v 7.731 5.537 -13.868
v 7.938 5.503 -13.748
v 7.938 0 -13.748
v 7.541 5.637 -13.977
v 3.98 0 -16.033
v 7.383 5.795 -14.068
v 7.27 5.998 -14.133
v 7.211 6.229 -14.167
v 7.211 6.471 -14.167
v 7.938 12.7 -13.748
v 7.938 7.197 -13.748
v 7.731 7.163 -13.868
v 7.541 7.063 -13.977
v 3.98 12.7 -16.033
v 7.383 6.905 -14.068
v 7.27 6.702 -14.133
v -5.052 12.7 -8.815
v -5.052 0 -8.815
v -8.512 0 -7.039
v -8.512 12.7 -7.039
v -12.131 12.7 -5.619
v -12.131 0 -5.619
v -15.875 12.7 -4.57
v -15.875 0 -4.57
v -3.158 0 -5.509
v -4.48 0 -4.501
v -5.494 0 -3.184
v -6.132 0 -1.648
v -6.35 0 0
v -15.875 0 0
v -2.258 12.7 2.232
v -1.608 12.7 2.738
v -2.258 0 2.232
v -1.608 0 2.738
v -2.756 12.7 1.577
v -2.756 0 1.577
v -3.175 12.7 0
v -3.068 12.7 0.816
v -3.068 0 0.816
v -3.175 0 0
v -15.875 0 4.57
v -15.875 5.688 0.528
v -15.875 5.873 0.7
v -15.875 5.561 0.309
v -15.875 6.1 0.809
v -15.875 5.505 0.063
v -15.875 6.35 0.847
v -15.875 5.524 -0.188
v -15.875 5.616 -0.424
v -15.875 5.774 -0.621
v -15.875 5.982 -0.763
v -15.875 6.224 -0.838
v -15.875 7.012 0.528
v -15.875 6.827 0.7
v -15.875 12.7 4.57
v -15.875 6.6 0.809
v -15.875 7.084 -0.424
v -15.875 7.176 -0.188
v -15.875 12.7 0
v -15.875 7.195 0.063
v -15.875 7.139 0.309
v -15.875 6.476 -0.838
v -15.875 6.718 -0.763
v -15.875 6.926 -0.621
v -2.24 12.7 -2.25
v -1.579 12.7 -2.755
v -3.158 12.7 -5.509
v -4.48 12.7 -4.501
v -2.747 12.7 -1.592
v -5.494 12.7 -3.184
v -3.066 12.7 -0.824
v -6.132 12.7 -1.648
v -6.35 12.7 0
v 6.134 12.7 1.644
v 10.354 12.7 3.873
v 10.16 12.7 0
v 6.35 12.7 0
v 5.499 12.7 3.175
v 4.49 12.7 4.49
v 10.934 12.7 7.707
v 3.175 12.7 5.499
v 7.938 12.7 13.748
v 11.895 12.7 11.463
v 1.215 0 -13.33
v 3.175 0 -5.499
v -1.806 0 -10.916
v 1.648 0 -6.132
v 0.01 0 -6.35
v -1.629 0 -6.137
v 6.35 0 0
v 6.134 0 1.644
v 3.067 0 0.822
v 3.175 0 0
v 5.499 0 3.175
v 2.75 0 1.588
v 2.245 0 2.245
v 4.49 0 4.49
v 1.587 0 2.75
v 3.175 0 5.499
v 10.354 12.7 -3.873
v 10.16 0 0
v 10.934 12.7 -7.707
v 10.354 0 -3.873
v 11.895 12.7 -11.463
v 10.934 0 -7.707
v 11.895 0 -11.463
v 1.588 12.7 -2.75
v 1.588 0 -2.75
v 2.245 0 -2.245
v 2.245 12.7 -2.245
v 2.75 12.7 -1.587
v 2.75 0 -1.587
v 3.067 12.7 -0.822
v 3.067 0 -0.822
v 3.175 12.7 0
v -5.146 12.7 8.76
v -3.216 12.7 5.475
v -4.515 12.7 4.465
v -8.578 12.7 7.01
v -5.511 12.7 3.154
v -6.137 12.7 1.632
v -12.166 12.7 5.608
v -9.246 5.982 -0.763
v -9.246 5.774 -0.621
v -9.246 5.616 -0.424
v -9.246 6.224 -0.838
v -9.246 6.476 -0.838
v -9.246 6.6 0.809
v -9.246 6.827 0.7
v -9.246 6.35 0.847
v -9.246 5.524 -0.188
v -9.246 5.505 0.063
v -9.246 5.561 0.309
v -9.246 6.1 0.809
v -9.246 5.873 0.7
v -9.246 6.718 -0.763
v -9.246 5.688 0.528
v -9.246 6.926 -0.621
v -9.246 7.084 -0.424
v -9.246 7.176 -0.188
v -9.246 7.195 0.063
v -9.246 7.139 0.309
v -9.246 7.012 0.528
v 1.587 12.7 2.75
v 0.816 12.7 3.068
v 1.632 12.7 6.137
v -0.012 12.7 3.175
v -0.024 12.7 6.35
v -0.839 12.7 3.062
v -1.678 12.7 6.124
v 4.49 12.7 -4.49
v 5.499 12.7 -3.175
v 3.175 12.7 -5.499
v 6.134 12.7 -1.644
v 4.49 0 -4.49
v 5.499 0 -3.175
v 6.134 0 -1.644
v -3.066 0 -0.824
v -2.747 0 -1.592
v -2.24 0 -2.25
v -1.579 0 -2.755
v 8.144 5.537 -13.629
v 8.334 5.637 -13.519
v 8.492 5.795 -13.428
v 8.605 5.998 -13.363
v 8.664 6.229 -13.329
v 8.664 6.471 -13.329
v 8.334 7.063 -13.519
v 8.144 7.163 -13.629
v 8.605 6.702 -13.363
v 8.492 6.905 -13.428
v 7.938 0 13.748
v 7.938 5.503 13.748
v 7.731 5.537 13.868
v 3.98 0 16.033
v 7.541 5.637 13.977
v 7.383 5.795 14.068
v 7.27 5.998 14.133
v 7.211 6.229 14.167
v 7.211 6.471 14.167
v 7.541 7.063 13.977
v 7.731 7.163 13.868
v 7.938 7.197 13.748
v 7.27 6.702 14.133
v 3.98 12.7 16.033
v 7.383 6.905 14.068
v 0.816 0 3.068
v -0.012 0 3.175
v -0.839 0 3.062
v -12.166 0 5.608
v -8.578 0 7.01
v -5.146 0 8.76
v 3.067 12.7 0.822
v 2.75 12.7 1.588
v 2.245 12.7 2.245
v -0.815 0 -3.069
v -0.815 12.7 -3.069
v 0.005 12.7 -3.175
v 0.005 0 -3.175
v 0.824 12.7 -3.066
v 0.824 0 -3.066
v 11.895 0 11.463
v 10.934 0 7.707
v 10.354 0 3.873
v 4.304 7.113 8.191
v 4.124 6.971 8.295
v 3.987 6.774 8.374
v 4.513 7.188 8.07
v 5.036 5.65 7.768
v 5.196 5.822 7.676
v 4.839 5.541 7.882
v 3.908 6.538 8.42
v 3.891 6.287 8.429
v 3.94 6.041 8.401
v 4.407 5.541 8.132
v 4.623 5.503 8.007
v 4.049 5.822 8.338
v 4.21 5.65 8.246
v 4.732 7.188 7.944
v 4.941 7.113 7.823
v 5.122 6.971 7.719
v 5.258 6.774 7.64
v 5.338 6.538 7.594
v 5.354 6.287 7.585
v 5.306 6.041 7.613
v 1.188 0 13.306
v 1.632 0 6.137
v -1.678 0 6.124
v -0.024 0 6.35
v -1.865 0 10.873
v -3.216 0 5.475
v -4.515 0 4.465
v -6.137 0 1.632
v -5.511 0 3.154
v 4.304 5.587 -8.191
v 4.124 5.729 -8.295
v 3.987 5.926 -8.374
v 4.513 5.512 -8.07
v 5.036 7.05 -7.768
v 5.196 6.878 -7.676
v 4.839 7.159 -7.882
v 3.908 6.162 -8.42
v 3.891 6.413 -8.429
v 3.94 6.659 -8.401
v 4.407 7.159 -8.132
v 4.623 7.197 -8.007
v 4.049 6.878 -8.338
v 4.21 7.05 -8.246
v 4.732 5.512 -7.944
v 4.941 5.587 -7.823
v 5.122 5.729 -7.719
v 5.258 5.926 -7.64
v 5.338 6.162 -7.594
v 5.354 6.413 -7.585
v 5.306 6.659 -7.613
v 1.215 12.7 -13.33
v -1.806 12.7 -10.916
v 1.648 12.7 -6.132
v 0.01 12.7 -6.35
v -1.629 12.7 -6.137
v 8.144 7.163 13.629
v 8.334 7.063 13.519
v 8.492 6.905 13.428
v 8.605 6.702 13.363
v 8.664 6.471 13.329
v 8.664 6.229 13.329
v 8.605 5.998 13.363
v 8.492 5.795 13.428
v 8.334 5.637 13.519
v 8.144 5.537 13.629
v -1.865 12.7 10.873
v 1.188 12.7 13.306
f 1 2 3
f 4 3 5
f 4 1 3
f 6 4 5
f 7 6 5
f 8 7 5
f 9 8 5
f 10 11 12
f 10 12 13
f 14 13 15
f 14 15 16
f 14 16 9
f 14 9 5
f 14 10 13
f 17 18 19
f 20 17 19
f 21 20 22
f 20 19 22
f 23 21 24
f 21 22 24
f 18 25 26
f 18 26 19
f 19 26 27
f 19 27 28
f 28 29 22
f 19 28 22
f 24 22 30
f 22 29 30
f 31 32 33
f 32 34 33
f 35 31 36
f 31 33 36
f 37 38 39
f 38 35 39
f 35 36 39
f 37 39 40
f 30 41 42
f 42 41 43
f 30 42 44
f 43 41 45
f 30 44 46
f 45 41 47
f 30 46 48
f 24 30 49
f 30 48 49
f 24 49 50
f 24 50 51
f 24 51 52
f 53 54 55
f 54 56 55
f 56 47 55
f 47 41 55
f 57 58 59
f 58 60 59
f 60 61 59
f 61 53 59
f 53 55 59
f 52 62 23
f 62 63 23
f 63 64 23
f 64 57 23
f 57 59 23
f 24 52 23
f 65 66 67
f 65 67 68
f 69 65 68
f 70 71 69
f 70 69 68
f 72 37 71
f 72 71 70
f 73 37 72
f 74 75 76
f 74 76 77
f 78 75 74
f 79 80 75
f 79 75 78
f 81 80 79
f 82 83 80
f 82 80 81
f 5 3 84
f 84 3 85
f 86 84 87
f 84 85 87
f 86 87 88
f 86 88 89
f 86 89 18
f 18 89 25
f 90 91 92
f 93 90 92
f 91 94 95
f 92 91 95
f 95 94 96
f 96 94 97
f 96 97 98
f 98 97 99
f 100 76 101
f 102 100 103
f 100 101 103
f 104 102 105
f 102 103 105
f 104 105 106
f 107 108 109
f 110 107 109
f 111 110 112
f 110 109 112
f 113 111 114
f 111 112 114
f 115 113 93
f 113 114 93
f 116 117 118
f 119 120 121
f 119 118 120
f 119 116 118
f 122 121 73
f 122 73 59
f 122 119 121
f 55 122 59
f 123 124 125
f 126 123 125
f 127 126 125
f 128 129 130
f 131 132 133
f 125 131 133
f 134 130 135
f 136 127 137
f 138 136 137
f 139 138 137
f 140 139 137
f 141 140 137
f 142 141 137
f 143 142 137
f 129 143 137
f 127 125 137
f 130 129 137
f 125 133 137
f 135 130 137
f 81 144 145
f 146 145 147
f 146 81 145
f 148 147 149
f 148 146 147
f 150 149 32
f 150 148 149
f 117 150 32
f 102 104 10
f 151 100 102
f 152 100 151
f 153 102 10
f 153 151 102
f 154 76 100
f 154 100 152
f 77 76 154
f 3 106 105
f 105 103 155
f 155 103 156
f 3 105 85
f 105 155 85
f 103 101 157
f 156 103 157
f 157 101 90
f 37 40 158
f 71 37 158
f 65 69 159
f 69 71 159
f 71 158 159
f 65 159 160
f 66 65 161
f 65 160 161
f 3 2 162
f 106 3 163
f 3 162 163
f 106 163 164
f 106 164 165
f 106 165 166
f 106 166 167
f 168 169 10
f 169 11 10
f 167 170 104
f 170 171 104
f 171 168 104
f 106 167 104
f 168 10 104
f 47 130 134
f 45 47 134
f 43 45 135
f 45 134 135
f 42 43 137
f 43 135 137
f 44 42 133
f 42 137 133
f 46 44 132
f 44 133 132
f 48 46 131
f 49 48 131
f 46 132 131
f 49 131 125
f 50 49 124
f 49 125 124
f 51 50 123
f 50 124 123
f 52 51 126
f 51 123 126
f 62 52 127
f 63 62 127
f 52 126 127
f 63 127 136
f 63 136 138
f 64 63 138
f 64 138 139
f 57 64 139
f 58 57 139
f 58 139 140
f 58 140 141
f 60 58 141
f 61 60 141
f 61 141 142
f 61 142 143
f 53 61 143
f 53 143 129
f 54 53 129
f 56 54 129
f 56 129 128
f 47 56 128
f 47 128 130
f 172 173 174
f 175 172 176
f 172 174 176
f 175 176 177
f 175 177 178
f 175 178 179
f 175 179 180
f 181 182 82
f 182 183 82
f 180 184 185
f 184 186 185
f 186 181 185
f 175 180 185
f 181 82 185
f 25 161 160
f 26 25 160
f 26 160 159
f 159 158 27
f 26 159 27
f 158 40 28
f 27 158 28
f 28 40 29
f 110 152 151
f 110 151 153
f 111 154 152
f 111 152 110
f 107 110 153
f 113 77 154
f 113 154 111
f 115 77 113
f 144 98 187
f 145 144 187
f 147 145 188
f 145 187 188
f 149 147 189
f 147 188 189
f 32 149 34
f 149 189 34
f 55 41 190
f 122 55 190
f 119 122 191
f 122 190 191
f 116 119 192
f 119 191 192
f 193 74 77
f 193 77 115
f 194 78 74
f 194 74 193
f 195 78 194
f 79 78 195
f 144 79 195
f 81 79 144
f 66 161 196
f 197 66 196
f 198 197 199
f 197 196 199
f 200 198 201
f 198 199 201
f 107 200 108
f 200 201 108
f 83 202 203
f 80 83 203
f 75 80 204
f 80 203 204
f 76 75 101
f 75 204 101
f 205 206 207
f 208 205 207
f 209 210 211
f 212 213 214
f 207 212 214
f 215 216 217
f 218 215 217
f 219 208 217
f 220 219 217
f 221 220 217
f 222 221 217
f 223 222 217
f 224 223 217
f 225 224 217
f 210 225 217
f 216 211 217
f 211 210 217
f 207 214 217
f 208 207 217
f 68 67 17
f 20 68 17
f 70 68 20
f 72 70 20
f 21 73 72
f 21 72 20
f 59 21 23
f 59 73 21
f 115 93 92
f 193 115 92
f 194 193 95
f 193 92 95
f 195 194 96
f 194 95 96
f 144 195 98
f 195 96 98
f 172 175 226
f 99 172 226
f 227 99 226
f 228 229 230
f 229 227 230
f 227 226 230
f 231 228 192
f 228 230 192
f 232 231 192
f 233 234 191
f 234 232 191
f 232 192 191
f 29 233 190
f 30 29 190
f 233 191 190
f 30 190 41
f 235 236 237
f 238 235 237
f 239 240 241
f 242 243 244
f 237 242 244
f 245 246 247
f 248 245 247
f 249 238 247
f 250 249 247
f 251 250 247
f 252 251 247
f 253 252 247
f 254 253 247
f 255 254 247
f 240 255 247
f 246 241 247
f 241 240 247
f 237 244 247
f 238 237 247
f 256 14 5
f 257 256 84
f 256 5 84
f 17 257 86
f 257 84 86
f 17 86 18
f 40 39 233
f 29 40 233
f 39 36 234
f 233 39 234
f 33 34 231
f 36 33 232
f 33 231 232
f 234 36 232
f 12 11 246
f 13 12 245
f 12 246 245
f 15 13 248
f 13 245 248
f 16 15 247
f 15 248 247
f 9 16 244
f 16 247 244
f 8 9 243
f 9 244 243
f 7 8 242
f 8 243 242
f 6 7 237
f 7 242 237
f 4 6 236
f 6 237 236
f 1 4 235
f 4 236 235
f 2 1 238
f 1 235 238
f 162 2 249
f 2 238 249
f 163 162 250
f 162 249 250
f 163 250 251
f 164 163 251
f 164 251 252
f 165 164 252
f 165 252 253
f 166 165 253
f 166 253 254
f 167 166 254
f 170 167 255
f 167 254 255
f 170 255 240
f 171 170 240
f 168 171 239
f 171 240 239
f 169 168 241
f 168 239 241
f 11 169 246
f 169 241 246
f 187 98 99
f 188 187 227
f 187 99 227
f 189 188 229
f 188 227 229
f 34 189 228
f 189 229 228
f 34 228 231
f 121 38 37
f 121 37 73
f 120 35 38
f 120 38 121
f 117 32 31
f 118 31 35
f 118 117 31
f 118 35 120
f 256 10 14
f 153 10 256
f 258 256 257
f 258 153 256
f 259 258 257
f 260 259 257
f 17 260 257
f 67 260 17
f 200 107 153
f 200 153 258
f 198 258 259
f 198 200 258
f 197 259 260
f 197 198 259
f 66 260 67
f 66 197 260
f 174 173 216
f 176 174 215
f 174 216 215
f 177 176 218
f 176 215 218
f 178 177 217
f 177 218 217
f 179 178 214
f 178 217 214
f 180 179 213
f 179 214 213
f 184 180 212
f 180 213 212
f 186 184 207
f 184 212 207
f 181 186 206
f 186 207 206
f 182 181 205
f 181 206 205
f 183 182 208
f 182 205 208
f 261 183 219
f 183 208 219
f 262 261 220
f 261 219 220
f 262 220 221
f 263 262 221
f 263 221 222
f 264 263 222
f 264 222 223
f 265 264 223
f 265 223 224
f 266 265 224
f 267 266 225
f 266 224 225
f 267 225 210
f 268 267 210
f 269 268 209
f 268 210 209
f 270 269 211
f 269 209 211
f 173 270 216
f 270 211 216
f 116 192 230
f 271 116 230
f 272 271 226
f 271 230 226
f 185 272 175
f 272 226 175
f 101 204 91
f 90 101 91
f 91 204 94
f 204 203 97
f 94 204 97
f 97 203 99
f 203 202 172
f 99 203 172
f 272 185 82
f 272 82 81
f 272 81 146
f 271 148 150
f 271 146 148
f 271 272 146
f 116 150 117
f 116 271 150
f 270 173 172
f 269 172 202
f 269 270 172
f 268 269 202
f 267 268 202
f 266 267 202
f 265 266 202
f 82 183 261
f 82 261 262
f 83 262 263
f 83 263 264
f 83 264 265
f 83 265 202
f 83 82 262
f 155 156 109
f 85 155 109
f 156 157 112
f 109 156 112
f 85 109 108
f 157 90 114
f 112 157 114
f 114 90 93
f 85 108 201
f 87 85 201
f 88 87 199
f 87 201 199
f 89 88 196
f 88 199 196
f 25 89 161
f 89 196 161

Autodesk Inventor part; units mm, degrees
ref_plane "YZ Plane" through (0, 0, 0) normal (1, 0, 0) x (0, 1, 0)
ref_plane "XZ Plane" through (0, 0, 0) normal (0, 1, 0) x (-1, 0, 0)
ref_plane "XY Plane" through (0, 0, 0) normal (0, 0, 1) x (1, 0, 0)
sketch "Sketch1" plane through (0, 0, 0) normal (0, 1, 0) x (-1, 0, 0)
  line L0 (0, 0) -> (28.575, 0)
  line L1 (28.575, 0) -> (0, 0)
  line L2 (0, 0) -> (-14.2875, -24.7467)
  line L3 (0, 0) -> (28.575, 0) construction
  line L4 (0, 0) -> (-14.2875, 24.7467)
  line L5 (0, 0) -> (28.575, 0) construction
  circle A0 centre (28.575, 0) radius 2.54
  circle A1 centre (-14.2875, -24.7467) radius 2.54
  circle A2 centre (-14.2875, 24.7467) radius 2.54
  circle A3 centre (0, 0) radius 3.175
  circle A4 centre (0, 0) radius 6.35
  line L6 (-1.5875, -2.7496) -> (0, 0)
  line L7 (0, 0) -> (-6.35, 0)
  circle A5 centre (-14.2875, 24.7467) radius 3.81
  circle A6 centre (28.575, 0) radius 3.81
  circle A7 centre (-14.2875, -24.7467) radius 3.81
  line L8 (30.6811, 3.175) -> (-12.1814, 27.9217)
  line L9 (28.2054, -3.792) -> (-10.8187, -26.3226)
  line L10 (-18.0975, 24.7467) -> (-18.0975, -24.7467)
  line L11 (0, 0) -> (5.0525, -8.8146)
  line L12 (0, 0) -> (5.1463, 8.7602)
  line L13 (0, 0) -> (-10.16, 0)
  arc A8 (28.2054, -3.792) -> (-10.8187, -26.3226) centre (24.4473, -42.344) ccw
  arc A9 (-10.8187, 26.3226) -> (28.2054, 3.792) centre (24.4473, 42.344) ccw
  arc A10 (-17.3867, -22.5305) -> (-17.3867, 22.5305) centre (-48.8947, 0) ccw
  point P0 (5.1074, 8.7829)
  point P1 (-10.16, 0.0317)
  point P2 (30.2716, 3.4114)
  point P3 (28.2054, 3.792)
  point P4 (-10.8187, 26.3226)
  point P5 (-17.3867, 22.5305)
  point P6 (-17.3867, -22.5305)
  dimension "d9" = 6.35
  dimension "d41" = 12.7
  dimension "d0" = 28.575
  dimension "d1" = 28.575
  dimension "d2" = 120
  dimension "d3" = 28.575
  dimension "d4" = 120
  dimension "d5" = 5.08
  dimension "d6" = 5.08
  dimension "d7" = 5.08
  dimension "d42" = 7.62
  dimension "d43" = 7.62
  dimension "d44" = 7.62
  dimension "d47" = 10.16
  dimension "d48" = 10.16
  dimension "d49" = 10.16
  dimension "d52" = 360
extrude "Extrusion4" add sketch "Sketch1" along normal blind 12.7 contours A3 L12 A4 L0 | L0 A4 L11 A3 | A3 L11 A4 L2 | L2 A4 L7 A3 | A3 L7 A4 L4 | L4 A4 L12 A3 | A4 L12 A9 A6 L0 | L0 A6 A8 L11 A4 | A4 L11 A8 A7 L2 | L2 A7 A10 L13 A4 | A4 L13 A10 A5 L4 | L4 A5 A9 L12 A4 | A6 L8 | A7 | A5 picked at (31.8987, 0.5122)
sketch "Sketch11" plane through (0, 12.7, 0) normal (0, 1, 0) x (1, 0, 0)
  arc A0 (10.8187, -26.3226) -> (-28.2054, -3.792) centre (-24.4473, -42.344) ccw projected
  arc A1 (17.3867, 22.5305) -> (17.3867, -22.5305) centre (48.8947, 0) ccw projected
  arc A2 (10.8187, -26.3226) -> (17.3867, -22.5305) centre (14.2875, -24.7467) ccw projected
  line L0 (0, 0) -> (14.2875, -24.7467)
  circle A3 centre (14.2875, -24.7467) radius 2.54 projected
  line L1 (14.2875, -24.7467) -> (8.2579, -14.3032)
  line L2 (14.2875, -24.7467) -> (7.9375, -13.7482)
  line L3 (7.9375, -13.7482) -> (11.895, -11.4633)
  line L4 (7.9375, -13.7482) -> (3.98, -16.033)
  circle A4 centre (14.2875, 24.7467) radius 2.54 projected
  line L5 (0, 0) -> (14.2875, 24.7467)
  line L6 (14.2875, 24.7467) -> (7.9375, 13.7482)
  line L7 (7.9375, 13.7482) -> (0, 0)
  circle A5 centre (-28.575, 0) radius 2.54 projected
  line L8 (0, 0) -> (-28.575, 0)
  line L9 (-28.575, 0) -> (-15.875, 0)
  line L10 (-15.875, 0) -> (-15.875, 4.5698)
  arc A6 (-28.2054, 3.792) -> (10.8187, 26.3226) centre (-24.4473, 42.344) ccw projected
  line L11 (-15.875, 0) -> (-15.875, -4.5698)
  line L12 (7.9375, 13.7482) -> (3.98, 16.033)
  line L13 (7.9375, 13.7482) -> (11.895, 11.4633)
  arc A7 (17.3867, 22.5305) -> (17.3867, -22.5305) centre (48.8947, 0) ccw projected
  arc A8 (-28.2054, 3.792) -> (-30.6811, -3.175) centre (-28.575, 0) ccw projected
  arc A9 (10.8187, -26.3226) -> (-28.2054, -3.792) centre (-24.4473, -42.344) ccw projected
  arc A10 (-30.2716, -3.4114) -> (-28.2054, -3.792) centre (-28.575, 0) ccw projected
  line L14 (-30.6811, -3.175) -> (-30.2716, -3.4114) projected
  arc A11 (17.3867, 22.5305) -> (10.8187, 26.3226) centre (14.2875, 24.7467) ccw projected
  point P0 (2.3124, -14.3387)
  point P1 (11.3663, -9.5918)
  point P2 (10.2682, -2.8934)
  point P3 (-3.012, -10.0809)
  dimension "d65" = 12.7
  dimension "d66" = 12.7
  dimension "d67" = 12.7
extrude "Extrusion6" cut sketch "Sketch11" against normal blind 25.4 contours A0 L4 L3 A1 A2 | A0 A10 L14 A8 A6 L10 L11 | L13 L12 A6 A11 A1
sketch "Sketch12" plane through (-15.875, 12.7, -4.5698) normal (-1, 0, 0) x (0, 0, 1)
  line L0 (0, -12.7) -> (0, 0) projected
  line L1 (0, -6.35) -> (9.0387, -6.35)
  line L2 (1.3948, 0) -> (7.7448, 0) projected
  line L3 (4.5698, 0) -> (4.5698, -12.7)
  line L4 (9.1395, -12.7) -> (20.6028, -12.7) projected
  line L5 (9.1395, 0) -> (20.6028, 0) projected
  line L6 (9.1395, -12.7) -> (9.1395, 0)
  line L7 (9.0387, -6.35) -> (9.1395, -6.35)
  line L8 (9.1395, 0) -> (9.1395, -12.7) projected
  point P0 (4.5698, -6.35)
sketch "Sketch13" plane through (11.895, 0, 11.4633) normal (0.5, 0, 0.8660254) x (0.8660254, 0, -0.5)
  line L0 (0, 12.7) -> (0, 0) projected
  line L1 (0, 6.35) -> (-9.1395, 6.35)
  line L2 (-9.1395, 0) -> (-9.1395, 12.7) projected
  line L3 (-9.1395, 12.7) -> (0, 12.7) projected
  line L4 (-4.5698, 12.7) -> (-4.5698, 0)
  point P0 (-4.5698, 6.35)
sketch "Sketch14" plane through (3.98, 0, -16.033) normal (0.5, 0, -0.8660254) x (-0.8660254, 0, -0.5)
  line L0 (-9.1395, 0) -> (-9.1395, 12.7) projected
  line L1 (-9.1395, 6.35) -> (0, 6.35)
  line L2 (0, 12.7) -> (0, 0) projected
  line L3 (-9.1395, 12.7) -> (0, 12.7) projected
  line L4 (-4.5698, 12.7) -> (-4.5698, 0)
  point P0 (-4.5698, 6.35)
hole "Hole5" at (7.9375, 6.35, 13.7482) direction (-0.5, 0, -0.8660254) diameter 1.6942 depth 6.6294 thread size "2-56 UNC" class "2B" standard "ANSI Unified Screw Threads"
hole "Hole6" at (-15.875, 6.35, 0) direction (1, 0, 0) diameter 1.6942 depth 6.6294 thread size "2-56 UNC" class "2B" standard "ANSI Unified Screw Threads"
hole "Hole7" at (7.9375, 6.35, -13.7482) direction (-0.5, 0, 0.8660254) diameter 1.6942 depth 6.6294 thread size "2-56 UNC" class "2B" standard "ANSI Unified Screw Threads"
properties part number "stability"
